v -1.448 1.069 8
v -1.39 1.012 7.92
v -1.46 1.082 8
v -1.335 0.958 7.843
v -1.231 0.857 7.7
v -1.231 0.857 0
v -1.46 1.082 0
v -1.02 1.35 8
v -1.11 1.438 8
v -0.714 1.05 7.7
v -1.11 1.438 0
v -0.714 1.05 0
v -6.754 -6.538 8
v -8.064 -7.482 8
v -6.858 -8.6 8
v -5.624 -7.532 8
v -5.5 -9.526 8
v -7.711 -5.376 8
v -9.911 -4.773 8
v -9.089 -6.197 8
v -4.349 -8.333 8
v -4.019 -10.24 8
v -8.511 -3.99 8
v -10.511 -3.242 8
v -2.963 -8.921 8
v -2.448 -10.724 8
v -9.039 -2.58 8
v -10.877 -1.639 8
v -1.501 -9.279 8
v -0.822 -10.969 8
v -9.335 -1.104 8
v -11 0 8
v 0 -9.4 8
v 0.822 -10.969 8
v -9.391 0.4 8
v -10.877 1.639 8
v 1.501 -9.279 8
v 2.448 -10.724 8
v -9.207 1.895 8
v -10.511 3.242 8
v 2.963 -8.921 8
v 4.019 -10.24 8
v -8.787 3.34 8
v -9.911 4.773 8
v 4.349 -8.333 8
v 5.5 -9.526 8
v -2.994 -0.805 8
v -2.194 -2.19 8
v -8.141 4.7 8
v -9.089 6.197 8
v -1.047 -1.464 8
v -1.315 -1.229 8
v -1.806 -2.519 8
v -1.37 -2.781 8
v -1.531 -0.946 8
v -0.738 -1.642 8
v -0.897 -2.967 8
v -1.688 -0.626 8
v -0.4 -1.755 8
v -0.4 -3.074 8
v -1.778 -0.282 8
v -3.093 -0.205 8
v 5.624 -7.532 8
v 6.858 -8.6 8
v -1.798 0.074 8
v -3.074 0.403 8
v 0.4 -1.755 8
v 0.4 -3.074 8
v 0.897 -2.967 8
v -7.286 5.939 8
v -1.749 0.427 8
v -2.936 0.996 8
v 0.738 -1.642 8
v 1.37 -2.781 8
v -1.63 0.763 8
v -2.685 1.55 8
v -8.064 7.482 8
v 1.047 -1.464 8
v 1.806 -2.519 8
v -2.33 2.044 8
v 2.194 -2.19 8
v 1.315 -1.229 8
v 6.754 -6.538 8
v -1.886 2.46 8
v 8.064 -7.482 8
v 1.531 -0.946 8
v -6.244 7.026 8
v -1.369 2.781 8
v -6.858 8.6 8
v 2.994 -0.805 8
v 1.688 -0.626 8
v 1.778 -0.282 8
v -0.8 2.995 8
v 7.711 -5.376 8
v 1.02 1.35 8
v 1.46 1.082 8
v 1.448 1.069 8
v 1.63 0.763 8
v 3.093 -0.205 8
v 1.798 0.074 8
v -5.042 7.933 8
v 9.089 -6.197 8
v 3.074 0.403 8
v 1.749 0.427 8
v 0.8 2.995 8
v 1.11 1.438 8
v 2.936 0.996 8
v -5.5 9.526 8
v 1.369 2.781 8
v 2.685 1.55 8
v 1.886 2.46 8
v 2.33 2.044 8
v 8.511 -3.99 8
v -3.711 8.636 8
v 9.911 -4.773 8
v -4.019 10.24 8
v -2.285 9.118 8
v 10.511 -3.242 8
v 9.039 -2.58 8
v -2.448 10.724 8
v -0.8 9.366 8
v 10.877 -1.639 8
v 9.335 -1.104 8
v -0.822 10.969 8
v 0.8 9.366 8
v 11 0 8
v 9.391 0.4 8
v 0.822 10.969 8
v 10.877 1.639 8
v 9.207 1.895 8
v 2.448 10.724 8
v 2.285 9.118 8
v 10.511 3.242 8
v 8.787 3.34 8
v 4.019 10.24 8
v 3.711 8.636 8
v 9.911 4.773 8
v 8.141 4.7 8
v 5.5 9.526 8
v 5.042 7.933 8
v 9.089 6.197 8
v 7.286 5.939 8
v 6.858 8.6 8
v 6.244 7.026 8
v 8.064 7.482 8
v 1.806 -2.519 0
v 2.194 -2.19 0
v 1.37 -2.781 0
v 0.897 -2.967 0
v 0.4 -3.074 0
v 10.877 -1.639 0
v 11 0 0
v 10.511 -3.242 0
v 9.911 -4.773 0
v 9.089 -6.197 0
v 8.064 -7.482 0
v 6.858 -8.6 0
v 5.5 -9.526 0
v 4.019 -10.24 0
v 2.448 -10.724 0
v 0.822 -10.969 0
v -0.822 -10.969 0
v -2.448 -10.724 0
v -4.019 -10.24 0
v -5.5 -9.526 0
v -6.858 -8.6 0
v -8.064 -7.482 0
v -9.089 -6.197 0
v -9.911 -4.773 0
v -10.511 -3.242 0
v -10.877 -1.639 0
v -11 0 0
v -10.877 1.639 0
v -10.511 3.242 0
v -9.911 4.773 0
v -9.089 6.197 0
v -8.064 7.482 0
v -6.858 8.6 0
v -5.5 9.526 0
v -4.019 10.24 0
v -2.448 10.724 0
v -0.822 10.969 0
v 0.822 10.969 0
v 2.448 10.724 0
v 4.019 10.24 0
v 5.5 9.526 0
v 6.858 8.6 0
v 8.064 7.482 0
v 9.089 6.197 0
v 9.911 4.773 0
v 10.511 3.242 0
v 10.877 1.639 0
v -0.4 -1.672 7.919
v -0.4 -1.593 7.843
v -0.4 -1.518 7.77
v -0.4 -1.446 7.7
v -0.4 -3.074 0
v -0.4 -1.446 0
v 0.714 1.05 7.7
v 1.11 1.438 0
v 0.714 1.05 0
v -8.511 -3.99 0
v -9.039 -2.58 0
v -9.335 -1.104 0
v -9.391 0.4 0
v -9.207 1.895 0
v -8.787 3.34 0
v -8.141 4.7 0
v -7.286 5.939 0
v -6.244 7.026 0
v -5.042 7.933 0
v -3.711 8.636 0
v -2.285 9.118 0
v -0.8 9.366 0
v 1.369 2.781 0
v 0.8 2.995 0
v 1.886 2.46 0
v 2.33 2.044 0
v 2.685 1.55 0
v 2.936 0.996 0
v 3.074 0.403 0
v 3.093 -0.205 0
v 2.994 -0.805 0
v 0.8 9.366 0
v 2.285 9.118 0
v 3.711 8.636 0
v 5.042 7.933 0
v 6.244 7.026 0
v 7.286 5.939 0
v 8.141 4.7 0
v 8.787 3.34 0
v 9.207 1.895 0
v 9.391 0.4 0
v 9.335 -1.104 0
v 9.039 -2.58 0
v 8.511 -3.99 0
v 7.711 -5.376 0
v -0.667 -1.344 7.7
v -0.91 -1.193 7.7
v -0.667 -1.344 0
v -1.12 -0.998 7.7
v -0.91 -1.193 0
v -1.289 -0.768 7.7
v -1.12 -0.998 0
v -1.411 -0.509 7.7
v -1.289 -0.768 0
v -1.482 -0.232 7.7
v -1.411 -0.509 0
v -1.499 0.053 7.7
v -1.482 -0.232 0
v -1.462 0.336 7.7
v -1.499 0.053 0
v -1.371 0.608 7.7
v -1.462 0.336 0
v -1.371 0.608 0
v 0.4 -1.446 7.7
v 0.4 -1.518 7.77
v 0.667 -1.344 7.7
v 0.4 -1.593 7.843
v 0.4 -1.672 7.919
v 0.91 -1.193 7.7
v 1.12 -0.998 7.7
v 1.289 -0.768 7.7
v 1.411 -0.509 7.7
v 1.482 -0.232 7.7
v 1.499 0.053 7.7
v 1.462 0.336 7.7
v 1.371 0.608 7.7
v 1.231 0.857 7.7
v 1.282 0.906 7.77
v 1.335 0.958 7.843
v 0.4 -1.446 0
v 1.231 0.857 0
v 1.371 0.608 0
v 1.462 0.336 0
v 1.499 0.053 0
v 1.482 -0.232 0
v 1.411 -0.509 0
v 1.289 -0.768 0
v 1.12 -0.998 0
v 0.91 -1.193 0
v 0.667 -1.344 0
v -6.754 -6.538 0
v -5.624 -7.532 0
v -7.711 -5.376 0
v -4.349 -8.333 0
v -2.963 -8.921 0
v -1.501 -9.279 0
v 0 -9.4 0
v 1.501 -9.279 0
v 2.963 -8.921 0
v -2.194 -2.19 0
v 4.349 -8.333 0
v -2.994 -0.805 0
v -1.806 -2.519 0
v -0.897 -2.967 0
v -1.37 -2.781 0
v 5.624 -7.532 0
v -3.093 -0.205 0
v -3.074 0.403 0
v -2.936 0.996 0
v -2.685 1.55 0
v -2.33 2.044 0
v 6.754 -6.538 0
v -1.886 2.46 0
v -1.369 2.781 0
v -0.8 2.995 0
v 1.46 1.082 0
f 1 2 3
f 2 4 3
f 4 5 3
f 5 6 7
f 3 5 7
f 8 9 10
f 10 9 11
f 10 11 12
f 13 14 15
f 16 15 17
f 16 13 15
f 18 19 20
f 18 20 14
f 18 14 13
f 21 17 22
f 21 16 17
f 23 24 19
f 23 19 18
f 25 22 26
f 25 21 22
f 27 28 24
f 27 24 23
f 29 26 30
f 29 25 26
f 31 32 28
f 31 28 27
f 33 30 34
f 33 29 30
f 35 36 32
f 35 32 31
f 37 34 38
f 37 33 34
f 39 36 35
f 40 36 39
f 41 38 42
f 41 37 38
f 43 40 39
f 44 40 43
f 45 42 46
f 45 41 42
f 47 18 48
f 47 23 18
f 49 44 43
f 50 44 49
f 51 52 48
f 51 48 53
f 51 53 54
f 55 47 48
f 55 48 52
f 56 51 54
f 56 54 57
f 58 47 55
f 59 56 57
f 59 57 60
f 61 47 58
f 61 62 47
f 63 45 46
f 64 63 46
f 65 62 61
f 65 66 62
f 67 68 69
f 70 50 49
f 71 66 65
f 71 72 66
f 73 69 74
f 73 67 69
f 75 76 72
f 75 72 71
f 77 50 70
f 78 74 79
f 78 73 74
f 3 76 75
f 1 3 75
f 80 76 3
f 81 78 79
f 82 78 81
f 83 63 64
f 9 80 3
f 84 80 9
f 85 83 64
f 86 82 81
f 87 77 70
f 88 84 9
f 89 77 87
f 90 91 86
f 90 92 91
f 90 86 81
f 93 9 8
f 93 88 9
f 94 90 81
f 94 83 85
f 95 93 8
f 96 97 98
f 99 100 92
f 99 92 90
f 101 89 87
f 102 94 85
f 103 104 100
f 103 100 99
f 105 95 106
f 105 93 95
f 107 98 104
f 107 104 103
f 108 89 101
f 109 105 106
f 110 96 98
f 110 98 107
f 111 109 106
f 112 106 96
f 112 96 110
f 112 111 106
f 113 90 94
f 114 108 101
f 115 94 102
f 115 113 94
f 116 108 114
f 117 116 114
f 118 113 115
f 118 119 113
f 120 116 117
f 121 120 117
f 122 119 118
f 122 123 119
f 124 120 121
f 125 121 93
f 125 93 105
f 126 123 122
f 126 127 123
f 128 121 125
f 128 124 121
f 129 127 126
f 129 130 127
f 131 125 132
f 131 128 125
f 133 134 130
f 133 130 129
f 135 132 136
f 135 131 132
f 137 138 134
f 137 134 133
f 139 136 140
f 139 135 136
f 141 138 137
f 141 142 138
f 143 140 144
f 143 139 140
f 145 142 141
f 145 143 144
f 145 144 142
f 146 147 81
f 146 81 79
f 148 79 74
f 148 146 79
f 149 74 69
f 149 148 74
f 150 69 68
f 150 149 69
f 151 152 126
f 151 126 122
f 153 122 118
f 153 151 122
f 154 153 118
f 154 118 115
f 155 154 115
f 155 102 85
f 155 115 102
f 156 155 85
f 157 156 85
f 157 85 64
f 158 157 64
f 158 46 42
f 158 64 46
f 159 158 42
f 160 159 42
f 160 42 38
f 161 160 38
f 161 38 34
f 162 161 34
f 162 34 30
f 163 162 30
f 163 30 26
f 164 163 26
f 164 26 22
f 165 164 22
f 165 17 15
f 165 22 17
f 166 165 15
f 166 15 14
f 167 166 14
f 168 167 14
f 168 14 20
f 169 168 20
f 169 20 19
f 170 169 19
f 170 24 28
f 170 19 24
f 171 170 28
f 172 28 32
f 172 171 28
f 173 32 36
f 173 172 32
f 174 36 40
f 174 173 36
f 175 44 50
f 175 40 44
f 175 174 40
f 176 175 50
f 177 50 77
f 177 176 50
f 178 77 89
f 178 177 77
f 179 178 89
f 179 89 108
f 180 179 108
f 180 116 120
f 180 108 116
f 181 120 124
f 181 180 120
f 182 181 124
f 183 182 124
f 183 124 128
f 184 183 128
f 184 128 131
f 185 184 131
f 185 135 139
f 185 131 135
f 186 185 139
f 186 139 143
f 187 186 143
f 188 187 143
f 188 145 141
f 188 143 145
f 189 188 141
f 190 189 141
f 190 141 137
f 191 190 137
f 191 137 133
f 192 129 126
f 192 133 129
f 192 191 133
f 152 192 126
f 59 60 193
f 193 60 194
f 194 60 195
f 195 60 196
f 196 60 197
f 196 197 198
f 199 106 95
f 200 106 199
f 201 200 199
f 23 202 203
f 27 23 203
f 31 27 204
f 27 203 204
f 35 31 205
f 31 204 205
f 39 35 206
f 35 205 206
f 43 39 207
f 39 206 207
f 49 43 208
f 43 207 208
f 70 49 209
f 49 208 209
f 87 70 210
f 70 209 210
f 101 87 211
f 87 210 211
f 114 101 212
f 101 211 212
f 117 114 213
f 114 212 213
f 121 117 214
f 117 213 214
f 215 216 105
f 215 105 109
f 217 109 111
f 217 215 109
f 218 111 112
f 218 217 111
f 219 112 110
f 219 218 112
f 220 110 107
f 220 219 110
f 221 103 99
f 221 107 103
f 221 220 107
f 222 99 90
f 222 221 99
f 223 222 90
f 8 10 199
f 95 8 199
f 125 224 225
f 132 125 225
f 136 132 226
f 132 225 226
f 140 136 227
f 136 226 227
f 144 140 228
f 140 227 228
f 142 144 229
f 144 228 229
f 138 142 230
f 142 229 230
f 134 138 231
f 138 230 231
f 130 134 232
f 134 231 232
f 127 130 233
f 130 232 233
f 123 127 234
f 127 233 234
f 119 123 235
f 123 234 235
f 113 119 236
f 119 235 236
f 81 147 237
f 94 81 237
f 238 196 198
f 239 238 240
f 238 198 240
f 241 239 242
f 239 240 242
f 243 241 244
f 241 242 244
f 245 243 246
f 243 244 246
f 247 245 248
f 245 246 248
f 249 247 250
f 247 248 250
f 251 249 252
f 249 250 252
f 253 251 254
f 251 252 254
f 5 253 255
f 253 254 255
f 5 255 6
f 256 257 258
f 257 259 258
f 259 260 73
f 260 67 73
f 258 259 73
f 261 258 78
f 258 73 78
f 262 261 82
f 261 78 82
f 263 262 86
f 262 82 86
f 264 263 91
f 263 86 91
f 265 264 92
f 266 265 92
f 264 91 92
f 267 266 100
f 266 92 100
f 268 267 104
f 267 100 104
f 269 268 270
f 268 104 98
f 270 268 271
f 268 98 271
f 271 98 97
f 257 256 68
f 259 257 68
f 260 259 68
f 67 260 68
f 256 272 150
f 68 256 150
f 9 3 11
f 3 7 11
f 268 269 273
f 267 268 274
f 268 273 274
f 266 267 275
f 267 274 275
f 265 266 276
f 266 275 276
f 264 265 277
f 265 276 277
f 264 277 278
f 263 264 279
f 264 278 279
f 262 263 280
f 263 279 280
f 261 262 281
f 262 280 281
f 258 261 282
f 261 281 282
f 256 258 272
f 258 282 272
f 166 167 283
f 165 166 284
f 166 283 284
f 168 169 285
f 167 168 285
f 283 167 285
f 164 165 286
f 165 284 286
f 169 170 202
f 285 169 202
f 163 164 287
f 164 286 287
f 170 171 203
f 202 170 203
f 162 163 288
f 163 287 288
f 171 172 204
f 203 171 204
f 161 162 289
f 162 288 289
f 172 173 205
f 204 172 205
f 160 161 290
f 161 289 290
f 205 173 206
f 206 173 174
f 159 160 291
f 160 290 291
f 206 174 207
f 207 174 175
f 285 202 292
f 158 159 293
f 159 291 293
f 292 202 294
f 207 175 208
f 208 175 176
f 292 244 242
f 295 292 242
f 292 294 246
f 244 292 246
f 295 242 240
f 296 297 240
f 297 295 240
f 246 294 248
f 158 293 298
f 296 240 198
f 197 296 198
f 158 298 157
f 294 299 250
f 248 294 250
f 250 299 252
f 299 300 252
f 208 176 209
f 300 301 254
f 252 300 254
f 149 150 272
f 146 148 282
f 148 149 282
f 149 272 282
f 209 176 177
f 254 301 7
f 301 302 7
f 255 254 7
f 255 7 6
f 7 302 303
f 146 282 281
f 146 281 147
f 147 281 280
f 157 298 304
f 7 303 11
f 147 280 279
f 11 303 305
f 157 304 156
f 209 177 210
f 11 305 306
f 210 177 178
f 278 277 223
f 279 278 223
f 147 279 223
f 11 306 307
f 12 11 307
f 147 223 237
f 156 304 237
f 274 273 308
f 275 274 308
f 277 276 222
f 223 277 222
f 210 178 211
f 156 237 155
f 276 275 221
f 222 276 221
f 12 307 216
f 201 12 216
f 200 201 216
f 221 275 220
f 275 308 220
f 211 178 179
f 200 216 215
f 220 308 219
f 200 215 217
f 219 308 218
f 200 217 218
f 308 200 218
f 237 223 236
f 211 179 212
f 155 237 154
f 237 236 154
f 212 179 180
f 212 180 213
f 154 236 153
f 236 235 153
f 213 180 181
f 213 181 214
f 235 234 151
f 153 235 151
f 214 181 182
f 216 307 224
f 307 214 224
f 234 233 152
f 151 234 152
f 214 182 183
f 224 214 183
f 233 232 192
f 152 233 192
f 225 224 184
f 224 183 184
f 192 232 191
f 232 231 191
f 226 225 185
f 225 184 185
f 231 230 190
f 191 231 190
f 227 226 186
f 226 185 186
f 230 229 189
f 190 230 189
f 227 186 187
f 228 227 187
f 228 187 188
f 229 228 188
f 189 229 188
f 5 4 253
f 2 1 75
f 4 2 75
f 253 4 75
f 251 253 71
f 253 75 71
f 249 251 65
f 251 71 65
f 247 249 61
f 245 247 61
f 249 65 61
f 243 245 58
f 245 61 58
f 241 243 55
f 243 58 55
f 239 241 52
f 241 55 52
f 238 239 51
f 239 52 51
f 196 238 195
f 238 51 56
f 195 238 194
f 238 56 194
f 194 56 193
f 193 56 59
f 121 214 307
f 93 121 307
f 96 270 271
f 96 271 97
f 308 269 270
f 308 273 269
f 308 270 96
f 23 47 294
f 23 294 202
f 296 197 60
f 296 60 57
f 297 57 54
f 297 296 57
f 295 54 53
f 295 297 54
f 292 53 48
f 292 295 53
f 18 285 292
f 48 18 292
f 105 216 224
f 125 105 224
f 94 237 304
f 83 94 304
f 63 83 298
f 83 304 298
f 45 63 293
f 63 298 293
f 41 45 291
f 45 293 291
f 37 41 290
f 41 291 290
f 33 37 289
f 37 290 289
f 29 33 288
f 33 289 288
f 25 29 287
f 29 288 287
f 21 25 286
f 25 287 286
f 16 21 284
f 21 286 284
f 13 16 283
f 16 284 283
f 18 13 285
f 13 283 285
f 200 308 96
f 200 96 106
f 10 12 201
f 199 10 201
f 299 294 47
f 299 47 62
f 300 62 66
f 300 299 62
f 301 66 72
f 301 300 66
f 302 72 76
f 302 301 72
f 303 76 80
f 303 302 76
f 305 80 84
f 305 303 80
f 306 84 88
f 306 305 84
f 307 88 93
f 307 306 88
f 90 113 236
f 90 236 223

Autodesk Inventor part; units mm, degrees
ref_plane "YZ Plane" through (0, 0, 0) normal (1, 0, 0) x (0, 1, 0)
ref_plane "XZ Plane" through (0, 0, 0) normal (0, 1, 0) x (-1, 0, 0)
ref_plane "XY Plane" through (0, 0, 0) normal (0, 0, 1) x (1, 0, 0)
sketch "スケッチ1" plane through (0, 0, 0) normal (0, 0, 1) x (1, 0, 0)
  circle A0 centre (0, 0) radius 1.5
  circle A1 centre (0, 0) radius 3.1
  line L0 (-0.4, 0) -> (0.4, 0)
  line L1 (0.4, 0) -> (0.4, -3.1)
  line L2 (0.4, -3.1) -> (-0.4, -3.1)
  line L3 (-0.4, -3.1) -> (-0.4, 0)
  line L4 (-1.0712, 1.05) -> (1.0712, 1.05)
  circle A2 centre (0, 0) radius 11
  circle A3 centre (0, 0) radius 9.4
  line L5 (-1.4605, 1.0815) -> (-1.1105, 1.4385)
  line L6 (-1.1105, 1.4385) -> (0.175, 0.1785)
  line L7 (0.175, 0.1785) -> (-0.175, -0.1785)
  line L8 (-0.175, -0.1785) -> (-1.4605, 1.0815)
  line L9 (1.4605, 1.0815) -> (1.1105, 1.4385)
  line L10 (1.1105, 1.4385) -> (-0.175, 0.1785)
  line L11 (-0.175, 0.1785) -> (0.175, -0.1785)
  line L12 (0.175, -0.1785) -> (1.4605, 1.0815)
  line L13 (0, 0) -> (-1.0712, 1.05) construction
  line L14 (1.0712, 1.05) -> (0, 0) construction
  point P0 (0.4, -1.4457)
  point P1 (0.4, -3.0741)
  point P2 (-0.4, -3.0741)
  point P3 (-0.4, -1.4457)
  point P4 (-0.7141, 1.05)
  point P5 (0.7141, 1.05)
  point P6 (1.2312, 0.8568)
  point P7 (-1.2312, 0.8568)
  dimension "SHAFT_D" = 3
  dimension "SLIT" = 0.8
  dimension "HUB_THIN" = 1.6
  dimension "d3" = 1.05
  dimension "WHEEL_D" = 22
  dimension "d5" = 1.6
  dimension "d18" = 0.5
  dimension "d19" = 1.8
extrude "ハブ＆リム" add sketch "スケッチ1" along normal blind 8 contours A0 L12 L9 L10 L6 L5 L8 L3 A1 L1 | L10 L4 L6 A0 | A2
sketch "スケッチ2" plane through (0, 0, 0) normal (0, 0, 1) x (1, 0, 0)
  line L0 (-0.8, 2.6) -> (0.8, 2.6)
  line L1 (0.8, 2.6) -> (0.8, 9.4)
  line L2 (0.8, 9.4) -> (-0.8, 9.4)
  line L3 (-0.8, 9.4) -> (-0.8, 2.6)
  circle A0 centre (0, 0) radius 9.4 projected
  point P0 (0, 9.4)
  dimension "d8" = 1.6
  dimension "d9" = 2.6
extrude "スポーク" add sketch "スケッチ2" along normal up to surface (8 mm away) contours L3 A0 L1 L0 | L3 L2 A0 | A0 L2 L1 picked at (0, 4.8667)
pattern_circular "円形状パターン1" count 3 over 360 about axis through (0, 0, -10) along (0, 0, 1) of "スポーク"
chamfer "面取り1" distance 0.3 angle 45 3 edges at (-1.4109, -0.5094, 8) (0, 1.05, 8) (1.4109, -0.5094, 8)
equation "\"d5\" = HUB_THIN"
properties part number "D-Shaft_Wheel3"
